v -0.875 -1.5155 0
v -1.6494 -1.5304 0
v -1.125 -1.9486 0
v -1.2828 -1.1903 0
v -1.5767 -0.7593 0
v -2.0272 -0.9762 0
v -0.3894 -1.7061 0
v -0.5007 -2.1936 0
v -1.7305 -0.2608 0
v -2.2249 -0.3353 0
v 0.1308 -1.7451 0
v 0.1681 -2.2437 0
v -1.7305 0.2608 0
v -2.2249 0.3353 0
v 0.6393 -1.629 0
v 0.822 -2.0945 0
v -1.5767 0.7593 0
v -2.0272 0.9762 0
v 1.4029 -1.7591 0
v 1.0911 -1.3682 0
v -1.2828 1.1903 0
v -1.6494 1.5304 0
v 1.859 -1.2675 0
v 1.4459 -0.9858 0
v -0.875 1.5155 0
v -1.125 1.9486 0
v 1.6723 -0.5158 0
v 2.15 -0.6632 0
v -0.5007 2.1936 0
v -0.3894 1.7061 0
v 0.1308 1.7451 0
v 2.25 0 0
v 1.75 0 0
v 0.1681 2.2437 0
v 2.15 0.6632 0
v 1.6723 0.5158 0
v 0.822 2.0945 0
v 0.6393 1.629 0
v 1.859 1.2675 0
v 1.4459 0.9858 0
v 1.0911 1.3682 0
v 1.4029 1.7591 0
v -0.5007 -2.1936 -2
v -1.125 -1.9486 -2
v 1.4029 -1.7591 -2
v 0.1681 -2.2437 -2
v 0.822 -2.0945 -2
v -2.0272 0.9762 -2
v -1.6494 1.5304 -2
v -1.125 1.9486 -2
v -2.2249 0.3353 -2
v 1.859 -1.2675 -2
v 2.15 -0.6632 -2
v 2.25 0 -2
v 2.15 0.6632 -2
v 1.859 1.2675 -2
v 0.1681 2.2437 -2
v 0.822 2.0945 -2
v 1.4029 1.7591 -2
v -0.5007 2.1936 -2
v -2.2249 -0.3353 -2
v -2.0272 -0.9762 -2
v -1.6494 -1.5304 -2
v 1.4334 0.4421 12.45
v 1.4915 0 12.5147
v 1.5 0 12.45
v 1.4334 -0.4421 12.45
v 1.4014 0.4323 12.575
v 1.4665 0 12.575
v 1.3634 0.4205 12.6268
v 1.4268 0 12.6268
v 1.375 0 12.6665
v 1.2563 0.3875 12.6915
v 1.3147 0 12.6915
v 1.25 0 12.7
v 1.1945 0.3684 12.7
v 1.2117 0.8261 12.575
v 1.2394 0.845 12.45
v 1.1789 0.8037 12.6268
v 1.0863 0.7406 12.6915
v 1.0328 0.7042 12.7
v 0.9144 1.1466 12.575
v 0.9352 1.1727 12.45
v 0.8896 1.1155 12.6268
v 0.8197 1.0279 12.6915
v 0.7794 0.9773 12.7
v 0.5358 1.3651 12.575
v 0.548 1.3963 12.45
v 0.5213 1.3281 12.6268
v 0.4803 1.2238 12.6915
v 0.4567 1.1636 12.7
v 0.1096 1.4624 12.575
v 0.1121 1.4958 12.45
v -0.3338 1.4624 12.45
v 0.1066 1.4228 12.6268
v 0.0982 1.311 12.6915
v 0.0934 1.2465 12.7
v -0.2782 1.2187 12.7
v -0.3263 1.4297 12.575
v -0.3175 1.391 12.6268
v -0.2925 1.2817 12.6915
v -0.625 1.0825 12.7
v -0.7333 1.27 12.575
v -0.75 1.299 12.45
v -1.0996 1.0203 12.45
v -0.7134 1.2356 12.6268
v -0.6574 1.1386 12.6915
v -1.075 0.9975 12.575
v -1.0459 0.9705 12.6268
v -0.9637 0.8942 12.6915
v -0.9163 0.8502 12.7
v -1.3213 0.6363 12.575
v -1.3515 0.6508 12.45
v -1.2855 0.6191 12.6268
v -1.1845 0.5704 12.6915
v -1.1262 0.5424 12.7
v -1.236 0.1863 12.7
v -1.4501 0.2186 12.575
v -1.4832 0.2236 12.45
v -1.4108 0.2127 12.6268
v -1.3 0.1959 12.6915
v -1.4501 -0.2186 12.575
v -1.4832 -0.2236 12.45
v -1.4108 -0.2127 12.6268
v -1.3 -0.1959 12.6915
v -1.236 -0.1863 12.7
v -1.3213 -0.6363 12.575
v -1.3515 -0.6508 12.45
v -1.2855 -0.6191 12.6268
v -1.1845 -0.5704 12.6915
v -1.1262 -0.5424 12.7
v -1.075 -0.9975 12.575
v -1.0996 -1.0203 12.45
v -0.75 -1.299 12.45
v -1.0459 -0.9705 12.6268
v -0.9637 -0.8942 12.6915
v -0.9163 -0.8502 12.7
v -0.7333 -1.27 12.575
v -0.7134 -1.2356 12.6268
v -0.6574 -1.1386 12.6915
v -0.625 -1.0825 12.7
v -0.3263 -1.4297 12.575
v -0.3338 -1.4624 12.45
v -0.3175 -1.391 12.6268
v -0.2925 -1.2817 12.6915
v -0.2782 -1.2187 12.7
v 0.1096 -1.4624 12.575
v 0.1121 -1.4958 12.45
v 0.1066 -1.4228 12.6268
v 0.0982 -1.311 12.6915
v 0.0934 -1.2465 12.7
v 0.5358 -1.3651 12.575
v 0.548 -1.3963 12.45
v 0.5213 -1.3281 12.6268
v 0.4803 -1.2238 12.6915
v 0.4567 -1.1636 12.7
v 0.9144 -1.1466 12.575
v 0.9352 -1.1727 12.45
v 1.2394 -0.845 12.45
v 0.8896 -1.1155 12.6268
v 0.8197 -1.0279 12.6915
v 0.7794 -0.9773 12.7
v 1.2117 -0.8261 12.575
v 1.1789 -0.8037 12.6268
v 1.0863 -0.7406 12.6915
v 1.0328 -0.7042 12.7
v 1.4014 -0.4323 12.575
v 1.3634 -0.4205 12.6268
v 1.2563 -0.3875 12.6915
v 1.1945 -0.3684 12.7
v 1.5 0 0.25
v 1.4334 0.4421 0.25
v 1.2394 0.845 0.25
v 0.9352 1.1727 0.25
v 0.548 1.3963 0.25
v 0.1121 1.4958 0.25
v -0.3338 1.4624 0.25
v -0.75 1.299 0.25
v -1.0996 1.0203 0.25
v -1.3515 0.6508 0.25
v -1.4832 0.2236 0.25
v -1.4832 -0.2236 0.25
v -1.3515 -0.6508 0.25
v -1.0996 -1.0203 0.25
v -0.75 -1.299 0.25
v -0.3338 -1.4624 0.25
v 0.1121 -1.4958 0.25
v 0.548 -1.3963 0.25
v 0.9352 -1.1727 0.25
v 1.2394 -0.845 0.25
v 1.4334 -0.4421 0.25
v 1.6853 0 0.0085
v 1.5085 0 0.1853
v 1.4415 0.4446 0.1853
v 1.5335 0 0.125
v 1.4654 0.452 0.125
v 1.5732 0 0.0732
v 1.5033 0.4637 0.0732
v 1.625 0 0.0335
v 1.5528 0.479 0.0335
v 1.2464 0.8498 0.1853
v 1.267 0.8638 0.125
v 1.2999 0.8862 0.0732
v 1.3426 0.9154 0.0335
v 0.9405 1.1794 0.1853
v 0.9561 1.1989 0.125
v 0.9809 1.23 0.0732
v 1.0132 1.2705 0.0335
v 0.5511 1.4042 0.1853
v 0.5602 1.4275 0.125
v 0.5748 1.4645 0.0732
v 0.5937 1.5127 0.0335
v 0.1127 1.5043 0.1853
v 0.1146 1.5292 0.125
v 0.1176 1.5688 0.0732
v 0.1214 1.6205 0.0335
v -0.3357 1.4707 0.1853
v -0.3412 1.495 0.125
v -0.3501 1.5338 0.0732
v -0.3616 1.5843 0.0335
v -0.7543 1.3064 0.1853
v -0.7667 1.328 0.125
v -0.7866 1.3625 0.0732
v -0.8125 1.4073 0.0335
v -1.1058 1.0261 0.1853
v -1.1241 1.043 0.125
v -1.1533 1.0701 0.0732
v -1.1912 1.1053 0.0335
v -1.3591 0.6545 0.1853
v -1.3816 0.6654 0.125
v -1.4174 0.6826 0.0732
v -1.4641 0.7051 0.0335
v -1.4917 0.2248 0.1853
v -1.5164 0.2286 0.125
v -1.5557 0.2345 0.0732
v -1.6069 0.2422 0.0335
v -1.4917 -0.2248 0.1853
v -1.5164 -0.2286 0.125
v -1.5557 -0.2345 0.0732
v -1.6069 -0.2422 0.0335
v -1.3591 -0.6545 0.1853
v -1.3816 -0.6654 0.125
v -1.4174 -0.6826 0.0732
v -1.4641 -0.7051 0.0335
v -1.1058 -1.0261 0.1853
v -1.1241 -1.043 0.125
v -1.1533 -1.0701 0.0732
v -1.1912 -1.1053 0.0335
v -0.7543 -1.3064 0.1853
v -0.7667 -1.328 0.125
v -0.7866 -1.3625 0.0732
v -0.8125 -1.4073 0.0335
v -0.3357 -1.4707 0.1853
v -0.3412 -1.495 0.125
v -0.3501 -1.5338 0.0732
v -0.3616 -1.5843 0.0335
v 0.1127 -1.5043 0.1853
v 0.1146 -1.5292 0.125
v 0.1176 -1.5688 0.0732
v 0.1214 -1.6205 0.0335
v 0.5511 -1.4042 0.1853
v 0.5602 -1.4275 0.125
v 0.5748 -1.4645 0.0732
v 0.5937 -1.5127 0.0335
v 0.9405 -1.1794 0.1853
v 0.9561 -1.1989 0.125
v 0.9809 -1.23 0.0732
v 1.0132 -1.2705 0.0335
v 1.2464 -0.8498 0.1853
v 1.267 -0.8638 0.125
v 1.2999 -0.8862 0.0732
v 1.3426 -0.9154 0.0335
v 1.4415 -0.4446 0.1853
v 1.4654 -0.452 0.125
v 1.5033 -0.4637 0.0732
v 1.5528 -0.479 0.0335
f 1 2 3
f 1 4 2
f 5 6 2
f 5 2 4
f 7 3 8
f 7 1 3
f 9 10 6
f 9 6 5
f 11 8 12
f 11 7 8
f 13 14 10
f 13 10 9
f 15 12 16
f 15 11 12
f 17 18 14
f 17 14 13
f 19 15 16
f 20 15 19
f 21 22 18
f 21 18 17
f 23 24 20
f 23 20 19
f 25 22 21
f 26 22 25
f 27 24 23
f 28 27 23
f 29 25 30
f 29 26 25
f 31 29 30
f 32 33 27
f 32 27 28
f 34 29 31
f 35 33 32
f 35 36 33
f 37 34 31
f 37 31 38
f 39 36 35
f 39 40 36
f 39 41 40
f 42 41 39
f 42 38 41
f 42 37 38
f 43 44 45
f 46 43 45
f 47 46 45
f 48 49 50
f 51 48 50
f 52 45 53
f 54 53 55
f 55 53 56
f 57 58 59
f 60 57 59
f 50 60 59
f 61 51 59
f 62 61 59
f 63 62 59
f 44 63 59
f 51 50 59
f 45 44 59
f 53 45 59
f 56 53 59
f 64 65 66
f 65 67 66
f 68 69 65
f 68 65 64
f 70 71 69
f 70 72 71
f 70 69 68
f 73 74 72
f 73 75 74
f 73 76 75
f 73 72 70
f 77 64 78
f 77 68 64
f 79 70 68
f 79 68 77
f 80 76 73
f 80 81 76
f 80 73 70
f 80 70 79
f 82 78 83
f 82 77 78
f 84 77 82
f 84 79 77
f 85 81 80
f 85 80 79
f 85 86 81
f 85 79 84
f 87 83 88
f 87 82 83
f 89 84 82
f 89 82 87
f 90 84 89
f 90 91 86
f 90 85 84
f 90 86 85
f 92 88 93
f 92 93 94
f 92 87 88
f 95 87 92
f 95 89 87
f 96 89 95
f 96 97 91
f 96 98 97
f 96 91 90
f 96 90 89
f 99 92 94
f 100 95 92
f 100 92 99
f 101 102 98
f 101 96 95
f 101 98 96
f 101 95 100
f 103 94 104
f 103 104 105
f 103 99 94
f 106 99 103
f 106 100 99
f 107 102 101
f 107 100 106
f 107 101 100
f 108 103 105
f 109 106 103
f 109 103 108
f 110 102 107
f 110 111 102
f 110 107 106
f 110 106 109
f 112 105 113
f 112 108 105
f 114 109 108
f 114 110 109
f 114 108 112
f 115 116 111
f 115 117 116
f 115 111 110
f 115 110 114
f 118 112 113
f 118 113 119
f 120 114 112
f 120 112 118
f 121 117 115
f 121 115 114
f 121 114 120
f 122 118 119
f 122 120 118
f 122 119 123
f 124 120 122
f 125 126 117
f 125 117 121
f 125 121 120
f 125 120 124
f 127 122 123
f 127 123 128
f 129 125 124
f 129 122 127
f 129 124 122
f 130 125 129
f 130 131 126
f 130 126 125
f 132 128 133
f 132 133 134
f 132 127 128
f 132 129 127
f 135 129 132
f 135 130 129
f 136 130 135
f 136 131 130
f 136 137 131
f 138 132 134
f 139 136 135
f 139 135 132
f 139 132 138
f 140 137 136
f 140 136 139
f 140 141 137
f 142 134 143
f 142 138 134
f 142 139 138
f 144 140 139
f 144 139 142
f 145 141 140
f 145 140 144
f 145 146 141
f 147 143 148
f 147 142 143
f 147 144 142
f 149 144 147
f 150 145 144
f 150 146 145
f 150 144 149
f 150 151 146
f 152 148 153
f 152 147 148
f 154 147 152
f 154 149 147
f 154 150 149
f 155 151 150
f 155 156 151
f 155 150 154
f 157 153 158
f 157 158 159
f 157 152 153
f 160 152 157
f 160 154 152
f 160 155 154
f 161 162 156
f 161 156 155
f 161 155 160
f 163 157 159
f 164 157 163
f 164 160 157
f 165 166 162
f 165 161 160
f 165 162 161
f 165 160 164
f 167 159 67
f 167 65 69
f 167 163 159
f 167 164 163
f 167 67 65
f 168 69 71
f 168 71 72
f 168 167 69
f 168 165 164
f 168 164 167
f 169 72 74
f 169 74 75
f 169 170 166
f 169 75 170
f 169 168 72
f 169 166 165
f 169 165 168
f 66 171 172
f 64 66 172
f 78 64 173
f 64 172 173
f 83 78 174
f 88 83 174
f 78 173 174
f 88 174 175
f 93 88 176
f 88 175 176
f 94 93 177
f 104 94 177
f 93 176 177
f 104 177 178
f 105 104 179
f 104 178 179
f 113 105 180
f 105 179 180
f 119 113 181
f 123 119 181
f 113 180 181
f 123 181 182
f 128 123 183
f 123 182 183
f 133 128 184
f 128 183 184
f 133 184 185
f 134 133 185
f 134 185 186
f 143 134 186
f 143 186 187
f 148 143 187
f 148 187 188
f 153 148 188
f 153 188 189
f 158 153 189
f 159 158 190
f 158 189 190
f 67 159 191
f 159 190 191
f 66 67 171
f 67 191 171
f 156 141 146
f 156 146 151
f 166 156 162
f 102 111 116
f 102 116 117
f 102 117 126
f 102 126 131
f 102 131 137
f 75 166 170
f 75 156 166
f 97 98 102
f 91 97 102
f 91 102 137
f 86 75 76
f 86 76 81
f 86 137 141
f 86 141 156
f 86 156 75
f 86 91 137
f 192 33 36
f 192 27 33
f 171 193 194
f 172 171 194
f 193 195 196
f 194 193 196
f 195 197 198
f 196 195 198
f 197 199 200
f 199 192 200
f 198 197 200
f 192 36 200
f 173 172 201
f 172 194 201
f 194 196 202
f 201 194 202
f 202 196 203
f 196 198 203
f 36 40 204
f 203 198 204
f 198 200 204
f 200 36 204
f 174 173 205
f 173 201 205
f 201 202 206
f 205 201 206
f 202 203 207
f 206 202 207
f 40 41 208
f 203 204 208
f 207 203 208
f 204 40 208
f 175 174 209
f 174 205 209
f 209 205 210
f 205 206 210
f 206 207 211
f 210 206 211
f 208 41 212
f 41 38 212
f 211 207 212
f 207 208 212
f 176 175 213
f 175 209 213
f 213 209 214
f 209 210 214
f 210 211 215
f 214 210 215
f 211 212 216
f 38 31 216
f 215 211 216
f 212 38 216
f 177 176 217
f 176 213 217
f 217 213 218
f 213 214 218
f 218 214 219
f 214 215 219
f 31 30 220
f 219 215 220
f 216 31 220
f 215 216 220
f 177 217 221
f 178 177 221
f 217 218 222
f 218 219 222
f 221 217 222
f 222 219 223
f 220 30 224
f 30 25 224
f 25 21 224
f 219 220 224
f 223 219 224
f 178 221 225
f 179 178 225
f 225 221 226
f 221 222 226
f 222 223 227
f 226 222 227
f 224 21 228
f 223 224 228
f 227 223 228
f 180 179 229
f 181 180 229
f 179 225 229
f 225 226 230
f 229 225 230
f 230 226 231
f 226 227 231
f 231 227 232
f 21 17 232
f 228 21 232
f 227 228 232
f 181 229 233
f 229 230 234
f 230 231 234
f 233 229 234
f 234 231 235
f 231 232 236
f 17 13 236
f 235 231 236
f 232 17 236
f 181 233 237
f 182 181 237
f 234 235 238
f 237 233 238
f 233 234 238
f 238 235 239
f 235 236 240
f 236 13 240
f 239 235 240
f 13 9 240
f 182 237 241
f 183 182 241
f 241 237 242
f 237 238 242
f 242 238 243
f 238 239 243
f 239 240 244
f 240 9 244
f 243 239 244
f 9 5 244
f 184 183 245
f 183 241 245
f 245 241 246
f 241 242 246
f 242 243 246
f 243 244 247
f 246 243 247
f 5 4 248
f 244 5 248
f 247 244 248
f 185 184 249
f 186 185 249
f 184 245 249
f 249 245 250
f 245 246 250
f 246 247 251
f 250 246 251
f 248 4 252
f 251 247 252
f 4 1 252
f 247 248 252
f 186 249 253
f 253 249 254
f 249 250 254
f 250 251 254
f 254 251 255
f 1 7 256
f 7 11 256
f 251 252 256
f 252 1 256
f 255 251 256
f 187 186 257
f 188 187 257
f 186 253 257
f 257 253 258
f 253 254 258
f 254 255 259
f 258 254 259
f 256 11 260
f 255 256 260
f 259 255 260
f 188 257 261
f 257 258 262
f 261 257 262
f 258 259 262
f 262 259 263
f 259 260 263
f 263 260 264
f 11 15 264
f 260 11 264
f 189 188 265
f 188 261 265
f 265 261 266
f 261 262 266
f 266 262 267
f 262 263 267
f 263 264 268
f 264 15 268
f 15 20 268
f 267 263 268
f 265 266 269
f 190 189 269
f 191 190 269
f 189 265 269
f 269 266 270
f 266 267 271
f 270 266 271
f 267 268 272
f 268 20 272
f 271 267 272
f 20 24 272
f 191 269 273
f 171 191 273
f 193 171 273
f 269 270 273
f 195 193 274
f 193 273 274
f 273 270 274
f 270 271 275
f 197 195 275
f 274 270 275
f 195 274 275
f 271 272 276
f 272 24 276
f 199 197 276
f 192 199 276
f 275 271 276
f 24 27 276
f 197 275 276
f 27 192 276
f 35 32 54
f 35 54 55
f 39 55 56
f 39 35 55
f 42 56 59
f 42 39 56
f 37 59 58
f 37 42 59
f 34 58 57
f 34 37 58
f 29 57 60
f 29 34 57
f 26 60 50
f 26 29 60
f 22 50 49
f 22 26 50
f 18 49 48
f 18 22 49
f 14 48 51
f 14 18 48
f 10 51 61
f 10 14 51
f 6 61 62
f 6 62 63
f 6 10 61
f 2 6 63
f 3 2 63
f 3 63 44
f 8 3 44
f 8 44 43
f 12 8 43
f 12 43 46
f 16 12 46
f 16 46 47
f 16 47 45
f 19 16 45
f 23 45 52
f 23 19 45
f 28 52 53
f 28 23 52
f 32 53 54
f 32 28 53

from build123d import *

# Parameters (mm, degrees)
SKETCH1_R           = 1.5
BOSS_EXTRUDE1_DEPTH = 12.7
SKETCH3_R           = 2.25
BOSS_EXTRUDE2_DEPTH = 2
FILLET2_R           = 0.25
FILLET3_R           = 0.25


with BuildPart() as part:
    # Sketch1 → Boss-Extrude1 (new body)
    with BuildSketch(Plane.XY):
        Circle(SKETCH1_R)
    extrude(amount=BOSS_EXTRUDE1_DEPTH)

    # Sketch3 → Boss-Extrude2 (add)
    with BuildSketch(Plane.XY):
        Circle(SKETCH3_R)
    extrude(amount=-BOSS_EXTRUDE2_DEPTH)

    # Fillet2
    fillet2_edges = [part.edges().sort_by_distance(p)[0] for p in [
        (-1.5, 0, 12.7),
    ]]
    fillet(fillet2_edges, radius=FILLET2_R)

    # Fillet3
    fillet3_edges = [part.edges().sort_by_distance(p)[0] for p in [
        (-1.5, 0, 0),
    ]]
    fillet(fillet3_edges, radius=FILLET3_R)


solid = part.part
